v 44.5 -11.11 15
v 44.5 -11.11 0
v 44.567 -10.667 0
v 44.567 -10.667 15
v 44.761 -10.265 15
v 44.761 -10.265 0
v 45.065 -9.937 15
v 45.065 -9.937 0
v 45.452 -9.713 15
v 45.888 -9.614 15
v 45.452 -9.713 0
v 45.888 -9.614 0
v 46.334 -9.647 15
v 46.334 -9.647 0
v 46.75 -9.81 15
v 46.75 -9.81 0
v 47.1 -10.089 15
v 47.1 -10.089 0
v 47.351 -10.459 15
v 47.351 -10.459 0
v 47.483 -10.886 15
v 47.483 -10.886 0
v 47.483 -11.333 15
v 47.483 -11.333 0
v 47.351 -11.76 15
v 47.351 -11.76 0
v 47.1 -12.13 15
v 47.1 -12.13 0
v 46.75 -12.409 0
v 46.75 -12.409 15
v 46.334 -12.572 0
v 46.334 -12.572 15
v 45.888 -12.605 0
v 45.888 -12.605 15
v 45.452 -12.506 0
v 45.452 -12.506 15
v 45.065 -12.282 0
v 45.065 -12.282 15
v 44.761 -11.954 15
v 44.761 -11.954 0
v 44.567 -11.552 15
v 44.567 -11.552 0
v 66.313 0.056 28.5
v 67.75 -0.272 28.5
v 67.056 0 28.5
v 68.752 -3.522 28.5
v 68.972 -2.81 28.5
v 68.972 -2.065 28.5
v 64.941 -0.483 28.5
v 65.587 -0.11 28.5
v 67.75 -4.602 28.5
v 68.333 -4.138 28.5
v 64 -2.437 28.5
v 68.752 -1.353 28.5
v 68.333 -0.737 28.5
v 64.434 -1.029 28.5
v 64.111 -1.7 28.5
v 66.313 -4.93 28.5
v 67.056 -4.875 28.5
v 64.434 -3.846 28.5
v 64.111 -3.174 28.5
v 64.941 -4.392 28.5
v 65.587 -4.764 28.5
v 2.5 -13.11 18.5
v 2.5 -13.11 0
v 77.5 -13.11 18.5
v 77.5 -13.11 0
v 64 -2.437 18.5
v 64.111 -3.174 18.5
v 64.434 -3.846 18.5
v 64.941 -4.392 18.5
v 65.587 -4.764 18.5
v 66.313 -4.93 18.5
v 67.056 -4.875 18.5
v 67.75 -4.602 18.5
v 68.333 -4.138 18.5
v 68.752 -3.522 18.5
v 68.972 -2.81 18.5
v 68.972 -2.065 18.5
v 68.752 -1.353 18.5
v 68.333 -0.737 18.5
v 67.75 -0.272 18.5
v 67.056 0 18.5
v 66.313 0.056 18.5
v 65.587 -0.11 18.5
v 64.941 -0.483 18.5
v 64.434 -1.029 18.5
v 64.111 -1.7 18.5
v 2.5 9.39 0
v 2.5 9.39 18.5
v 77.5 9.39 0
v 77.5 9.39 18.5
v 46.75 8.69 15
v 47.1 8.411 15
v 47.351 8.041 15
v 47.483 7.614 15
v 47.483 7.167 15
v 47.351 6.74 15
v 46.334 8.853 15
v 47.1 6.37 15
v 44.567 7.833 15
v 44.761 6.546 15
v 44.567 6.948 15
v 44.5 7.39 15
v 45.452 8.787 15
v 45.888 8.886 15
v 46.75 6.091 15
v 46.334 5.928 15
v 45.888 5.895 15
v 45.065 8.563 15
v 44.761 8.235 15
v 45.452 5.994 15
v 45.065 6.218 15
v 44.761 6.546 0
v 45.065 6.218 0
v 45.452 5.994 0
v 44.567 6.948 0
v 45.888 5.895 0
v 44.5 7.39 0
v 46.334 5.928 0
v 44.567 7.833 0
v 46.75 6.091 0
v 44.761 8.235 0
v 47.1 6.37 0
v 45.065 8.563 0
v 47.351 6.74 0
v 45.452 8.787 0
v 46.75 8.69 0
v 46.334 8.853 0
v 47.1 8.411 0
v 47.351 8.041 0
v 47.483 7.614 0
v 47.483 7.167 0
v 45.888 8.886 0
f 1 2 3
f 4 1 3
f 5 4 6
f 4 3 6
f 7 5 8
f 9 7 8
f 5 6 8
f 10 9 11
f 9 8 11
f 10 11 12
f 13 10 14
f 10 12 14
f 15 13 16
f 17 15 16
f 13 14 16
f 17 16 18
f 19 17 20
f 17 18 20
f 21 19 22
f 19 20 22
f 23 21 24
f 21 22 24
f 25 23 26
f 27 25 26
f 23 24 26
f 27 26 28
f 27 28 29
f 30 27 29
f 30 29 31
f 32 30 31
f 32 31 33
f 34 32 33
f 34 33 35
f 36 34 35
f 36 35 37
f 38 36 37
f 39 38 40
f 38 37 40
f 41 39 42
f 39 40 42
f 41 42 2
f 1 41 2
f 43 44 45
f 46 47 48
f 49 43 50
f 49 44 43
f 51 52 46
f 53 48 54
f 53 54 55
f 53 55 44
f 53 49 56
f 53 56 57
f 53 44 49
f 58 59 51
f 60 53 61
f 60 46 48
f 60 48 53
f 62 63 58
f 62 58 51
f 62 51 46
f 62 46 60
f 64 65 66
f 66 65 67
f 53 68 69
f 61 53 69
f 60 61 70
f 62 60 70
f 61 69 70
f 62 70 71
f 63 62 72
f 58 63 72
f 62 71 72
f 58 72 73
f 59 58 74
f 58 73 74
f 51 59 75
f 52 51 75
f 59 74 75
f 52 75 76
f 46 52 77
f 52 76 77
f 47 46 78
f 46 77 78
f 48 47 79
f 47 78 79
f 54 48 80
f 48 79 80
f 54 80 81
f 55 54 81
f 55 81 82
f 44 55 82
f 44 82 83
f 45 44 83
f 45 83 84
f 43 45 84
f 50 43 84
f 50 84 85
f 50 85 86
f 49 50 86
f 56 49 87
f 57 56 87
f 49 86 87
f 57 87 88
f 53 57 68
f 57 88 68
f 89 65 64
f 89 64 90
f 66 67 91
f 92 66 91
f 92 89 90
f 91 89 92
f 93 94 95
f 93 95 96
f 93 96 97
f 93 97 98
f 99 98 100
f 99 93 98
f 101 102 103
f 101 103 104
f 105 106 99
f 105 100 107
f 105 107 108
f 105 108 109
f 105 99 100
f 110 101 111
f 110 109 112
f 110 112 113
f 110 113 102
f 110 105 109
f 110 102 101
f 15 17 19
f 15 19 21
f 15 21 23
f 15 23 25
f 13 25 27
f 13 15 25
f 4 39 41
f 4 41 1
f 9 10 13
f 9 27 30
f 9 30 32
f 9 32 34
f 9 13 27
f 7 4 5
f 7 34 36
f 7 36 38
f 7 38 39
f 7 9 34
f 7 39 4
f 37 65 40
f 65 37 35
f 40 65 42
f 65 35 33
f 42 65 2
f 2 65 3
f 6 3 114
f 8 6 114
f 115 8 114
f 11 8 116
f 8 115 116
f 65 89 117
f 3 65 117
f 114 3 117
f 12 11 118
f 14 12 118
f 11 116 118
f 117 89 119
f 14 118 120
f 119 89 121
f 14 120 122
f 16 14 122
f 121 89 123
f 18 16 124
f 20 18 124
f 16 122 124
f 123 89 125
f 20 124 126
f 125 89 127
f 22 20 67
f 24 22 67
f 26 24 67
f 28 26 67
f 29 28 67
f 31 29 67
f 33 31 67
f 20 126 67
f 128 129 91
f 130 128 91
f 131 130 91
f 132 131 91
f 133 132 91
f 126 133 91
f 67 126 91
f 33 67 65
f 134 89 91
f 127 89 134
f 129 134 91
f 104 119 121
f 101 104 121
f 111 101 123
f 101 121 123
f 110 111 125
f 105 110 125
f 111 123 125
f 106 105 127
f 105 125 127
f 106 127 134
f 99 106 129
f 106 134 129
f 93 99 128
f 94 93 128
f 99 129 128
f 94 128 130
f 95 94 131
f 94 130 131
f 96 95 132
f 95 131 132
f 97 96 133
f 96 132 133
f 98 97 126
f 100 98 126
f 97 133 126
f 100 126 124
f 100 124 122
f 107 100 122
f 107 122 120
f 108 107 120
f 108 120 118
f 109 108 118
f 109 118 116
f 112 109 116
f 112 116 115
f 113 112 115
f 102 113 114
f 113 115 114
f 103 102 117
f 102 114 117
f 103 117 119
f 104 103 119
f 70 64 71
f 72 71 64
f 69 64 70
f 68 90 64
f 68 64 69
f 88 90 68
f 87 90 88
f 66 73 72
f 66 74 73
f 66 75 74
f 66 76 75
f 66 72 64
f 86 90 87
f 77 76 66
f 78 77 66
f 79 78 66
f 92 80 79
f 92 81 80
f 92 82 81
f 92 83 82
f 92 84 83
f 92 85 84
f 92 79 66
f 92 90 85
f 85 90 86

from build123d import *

# Parameters (mm, degrees)
SKETCH1_W           = 75
SKETCH1_H           = 22.5
BOSS_EXTRUDE1_DEPTH = 18.5
SKETCH2_R           = 2.5
BOSS_EXTRUDE2_DEPTH = 10
SKETCH3_R           = 1.5
CUT_EXTRUDE1_DEPTH  = 15


with BuildPart() as part:
    # Sketch1 → Boss-Extrude1 (new body)
    with BuildSketch(Plane.XY):
        with Locations((40, -1.859504132)):
            Rectangle(SKETCH1_W, SKETCH1_H)
    extrude(amount=BOSS_EXTRUDE1_DEPTH)

    # Sketch2 → Boss-Extrude2 (add)
    with BuildSketch(Plane.XY.offset(18.5)):
        with Locations(Location((66.5, -2.437272613, 0), (0, 0, 180))):
            Circle(SKETCH2_R)
    extrude(amount=BOSS_EXTRUDE2_DEPTH)

    # Sketch3 → Cut-Extrude1 (cut)
    with BuildSketch(Plane(origin=(0, 0, 0), x_dir=(-1, 0, 0), z_dir=(0, 0, -1))):
        with Locations((-46, 7.390495868)):
            Circle(SKETCH3_R)
        with Locations((-46, -11.109504132)):
            Circle(SKETCH3_R)
    extrude(amount=-CUT_EXTRUDE1_DEPTH, mode=Mode.SUBTRACT)


solid = part.part
